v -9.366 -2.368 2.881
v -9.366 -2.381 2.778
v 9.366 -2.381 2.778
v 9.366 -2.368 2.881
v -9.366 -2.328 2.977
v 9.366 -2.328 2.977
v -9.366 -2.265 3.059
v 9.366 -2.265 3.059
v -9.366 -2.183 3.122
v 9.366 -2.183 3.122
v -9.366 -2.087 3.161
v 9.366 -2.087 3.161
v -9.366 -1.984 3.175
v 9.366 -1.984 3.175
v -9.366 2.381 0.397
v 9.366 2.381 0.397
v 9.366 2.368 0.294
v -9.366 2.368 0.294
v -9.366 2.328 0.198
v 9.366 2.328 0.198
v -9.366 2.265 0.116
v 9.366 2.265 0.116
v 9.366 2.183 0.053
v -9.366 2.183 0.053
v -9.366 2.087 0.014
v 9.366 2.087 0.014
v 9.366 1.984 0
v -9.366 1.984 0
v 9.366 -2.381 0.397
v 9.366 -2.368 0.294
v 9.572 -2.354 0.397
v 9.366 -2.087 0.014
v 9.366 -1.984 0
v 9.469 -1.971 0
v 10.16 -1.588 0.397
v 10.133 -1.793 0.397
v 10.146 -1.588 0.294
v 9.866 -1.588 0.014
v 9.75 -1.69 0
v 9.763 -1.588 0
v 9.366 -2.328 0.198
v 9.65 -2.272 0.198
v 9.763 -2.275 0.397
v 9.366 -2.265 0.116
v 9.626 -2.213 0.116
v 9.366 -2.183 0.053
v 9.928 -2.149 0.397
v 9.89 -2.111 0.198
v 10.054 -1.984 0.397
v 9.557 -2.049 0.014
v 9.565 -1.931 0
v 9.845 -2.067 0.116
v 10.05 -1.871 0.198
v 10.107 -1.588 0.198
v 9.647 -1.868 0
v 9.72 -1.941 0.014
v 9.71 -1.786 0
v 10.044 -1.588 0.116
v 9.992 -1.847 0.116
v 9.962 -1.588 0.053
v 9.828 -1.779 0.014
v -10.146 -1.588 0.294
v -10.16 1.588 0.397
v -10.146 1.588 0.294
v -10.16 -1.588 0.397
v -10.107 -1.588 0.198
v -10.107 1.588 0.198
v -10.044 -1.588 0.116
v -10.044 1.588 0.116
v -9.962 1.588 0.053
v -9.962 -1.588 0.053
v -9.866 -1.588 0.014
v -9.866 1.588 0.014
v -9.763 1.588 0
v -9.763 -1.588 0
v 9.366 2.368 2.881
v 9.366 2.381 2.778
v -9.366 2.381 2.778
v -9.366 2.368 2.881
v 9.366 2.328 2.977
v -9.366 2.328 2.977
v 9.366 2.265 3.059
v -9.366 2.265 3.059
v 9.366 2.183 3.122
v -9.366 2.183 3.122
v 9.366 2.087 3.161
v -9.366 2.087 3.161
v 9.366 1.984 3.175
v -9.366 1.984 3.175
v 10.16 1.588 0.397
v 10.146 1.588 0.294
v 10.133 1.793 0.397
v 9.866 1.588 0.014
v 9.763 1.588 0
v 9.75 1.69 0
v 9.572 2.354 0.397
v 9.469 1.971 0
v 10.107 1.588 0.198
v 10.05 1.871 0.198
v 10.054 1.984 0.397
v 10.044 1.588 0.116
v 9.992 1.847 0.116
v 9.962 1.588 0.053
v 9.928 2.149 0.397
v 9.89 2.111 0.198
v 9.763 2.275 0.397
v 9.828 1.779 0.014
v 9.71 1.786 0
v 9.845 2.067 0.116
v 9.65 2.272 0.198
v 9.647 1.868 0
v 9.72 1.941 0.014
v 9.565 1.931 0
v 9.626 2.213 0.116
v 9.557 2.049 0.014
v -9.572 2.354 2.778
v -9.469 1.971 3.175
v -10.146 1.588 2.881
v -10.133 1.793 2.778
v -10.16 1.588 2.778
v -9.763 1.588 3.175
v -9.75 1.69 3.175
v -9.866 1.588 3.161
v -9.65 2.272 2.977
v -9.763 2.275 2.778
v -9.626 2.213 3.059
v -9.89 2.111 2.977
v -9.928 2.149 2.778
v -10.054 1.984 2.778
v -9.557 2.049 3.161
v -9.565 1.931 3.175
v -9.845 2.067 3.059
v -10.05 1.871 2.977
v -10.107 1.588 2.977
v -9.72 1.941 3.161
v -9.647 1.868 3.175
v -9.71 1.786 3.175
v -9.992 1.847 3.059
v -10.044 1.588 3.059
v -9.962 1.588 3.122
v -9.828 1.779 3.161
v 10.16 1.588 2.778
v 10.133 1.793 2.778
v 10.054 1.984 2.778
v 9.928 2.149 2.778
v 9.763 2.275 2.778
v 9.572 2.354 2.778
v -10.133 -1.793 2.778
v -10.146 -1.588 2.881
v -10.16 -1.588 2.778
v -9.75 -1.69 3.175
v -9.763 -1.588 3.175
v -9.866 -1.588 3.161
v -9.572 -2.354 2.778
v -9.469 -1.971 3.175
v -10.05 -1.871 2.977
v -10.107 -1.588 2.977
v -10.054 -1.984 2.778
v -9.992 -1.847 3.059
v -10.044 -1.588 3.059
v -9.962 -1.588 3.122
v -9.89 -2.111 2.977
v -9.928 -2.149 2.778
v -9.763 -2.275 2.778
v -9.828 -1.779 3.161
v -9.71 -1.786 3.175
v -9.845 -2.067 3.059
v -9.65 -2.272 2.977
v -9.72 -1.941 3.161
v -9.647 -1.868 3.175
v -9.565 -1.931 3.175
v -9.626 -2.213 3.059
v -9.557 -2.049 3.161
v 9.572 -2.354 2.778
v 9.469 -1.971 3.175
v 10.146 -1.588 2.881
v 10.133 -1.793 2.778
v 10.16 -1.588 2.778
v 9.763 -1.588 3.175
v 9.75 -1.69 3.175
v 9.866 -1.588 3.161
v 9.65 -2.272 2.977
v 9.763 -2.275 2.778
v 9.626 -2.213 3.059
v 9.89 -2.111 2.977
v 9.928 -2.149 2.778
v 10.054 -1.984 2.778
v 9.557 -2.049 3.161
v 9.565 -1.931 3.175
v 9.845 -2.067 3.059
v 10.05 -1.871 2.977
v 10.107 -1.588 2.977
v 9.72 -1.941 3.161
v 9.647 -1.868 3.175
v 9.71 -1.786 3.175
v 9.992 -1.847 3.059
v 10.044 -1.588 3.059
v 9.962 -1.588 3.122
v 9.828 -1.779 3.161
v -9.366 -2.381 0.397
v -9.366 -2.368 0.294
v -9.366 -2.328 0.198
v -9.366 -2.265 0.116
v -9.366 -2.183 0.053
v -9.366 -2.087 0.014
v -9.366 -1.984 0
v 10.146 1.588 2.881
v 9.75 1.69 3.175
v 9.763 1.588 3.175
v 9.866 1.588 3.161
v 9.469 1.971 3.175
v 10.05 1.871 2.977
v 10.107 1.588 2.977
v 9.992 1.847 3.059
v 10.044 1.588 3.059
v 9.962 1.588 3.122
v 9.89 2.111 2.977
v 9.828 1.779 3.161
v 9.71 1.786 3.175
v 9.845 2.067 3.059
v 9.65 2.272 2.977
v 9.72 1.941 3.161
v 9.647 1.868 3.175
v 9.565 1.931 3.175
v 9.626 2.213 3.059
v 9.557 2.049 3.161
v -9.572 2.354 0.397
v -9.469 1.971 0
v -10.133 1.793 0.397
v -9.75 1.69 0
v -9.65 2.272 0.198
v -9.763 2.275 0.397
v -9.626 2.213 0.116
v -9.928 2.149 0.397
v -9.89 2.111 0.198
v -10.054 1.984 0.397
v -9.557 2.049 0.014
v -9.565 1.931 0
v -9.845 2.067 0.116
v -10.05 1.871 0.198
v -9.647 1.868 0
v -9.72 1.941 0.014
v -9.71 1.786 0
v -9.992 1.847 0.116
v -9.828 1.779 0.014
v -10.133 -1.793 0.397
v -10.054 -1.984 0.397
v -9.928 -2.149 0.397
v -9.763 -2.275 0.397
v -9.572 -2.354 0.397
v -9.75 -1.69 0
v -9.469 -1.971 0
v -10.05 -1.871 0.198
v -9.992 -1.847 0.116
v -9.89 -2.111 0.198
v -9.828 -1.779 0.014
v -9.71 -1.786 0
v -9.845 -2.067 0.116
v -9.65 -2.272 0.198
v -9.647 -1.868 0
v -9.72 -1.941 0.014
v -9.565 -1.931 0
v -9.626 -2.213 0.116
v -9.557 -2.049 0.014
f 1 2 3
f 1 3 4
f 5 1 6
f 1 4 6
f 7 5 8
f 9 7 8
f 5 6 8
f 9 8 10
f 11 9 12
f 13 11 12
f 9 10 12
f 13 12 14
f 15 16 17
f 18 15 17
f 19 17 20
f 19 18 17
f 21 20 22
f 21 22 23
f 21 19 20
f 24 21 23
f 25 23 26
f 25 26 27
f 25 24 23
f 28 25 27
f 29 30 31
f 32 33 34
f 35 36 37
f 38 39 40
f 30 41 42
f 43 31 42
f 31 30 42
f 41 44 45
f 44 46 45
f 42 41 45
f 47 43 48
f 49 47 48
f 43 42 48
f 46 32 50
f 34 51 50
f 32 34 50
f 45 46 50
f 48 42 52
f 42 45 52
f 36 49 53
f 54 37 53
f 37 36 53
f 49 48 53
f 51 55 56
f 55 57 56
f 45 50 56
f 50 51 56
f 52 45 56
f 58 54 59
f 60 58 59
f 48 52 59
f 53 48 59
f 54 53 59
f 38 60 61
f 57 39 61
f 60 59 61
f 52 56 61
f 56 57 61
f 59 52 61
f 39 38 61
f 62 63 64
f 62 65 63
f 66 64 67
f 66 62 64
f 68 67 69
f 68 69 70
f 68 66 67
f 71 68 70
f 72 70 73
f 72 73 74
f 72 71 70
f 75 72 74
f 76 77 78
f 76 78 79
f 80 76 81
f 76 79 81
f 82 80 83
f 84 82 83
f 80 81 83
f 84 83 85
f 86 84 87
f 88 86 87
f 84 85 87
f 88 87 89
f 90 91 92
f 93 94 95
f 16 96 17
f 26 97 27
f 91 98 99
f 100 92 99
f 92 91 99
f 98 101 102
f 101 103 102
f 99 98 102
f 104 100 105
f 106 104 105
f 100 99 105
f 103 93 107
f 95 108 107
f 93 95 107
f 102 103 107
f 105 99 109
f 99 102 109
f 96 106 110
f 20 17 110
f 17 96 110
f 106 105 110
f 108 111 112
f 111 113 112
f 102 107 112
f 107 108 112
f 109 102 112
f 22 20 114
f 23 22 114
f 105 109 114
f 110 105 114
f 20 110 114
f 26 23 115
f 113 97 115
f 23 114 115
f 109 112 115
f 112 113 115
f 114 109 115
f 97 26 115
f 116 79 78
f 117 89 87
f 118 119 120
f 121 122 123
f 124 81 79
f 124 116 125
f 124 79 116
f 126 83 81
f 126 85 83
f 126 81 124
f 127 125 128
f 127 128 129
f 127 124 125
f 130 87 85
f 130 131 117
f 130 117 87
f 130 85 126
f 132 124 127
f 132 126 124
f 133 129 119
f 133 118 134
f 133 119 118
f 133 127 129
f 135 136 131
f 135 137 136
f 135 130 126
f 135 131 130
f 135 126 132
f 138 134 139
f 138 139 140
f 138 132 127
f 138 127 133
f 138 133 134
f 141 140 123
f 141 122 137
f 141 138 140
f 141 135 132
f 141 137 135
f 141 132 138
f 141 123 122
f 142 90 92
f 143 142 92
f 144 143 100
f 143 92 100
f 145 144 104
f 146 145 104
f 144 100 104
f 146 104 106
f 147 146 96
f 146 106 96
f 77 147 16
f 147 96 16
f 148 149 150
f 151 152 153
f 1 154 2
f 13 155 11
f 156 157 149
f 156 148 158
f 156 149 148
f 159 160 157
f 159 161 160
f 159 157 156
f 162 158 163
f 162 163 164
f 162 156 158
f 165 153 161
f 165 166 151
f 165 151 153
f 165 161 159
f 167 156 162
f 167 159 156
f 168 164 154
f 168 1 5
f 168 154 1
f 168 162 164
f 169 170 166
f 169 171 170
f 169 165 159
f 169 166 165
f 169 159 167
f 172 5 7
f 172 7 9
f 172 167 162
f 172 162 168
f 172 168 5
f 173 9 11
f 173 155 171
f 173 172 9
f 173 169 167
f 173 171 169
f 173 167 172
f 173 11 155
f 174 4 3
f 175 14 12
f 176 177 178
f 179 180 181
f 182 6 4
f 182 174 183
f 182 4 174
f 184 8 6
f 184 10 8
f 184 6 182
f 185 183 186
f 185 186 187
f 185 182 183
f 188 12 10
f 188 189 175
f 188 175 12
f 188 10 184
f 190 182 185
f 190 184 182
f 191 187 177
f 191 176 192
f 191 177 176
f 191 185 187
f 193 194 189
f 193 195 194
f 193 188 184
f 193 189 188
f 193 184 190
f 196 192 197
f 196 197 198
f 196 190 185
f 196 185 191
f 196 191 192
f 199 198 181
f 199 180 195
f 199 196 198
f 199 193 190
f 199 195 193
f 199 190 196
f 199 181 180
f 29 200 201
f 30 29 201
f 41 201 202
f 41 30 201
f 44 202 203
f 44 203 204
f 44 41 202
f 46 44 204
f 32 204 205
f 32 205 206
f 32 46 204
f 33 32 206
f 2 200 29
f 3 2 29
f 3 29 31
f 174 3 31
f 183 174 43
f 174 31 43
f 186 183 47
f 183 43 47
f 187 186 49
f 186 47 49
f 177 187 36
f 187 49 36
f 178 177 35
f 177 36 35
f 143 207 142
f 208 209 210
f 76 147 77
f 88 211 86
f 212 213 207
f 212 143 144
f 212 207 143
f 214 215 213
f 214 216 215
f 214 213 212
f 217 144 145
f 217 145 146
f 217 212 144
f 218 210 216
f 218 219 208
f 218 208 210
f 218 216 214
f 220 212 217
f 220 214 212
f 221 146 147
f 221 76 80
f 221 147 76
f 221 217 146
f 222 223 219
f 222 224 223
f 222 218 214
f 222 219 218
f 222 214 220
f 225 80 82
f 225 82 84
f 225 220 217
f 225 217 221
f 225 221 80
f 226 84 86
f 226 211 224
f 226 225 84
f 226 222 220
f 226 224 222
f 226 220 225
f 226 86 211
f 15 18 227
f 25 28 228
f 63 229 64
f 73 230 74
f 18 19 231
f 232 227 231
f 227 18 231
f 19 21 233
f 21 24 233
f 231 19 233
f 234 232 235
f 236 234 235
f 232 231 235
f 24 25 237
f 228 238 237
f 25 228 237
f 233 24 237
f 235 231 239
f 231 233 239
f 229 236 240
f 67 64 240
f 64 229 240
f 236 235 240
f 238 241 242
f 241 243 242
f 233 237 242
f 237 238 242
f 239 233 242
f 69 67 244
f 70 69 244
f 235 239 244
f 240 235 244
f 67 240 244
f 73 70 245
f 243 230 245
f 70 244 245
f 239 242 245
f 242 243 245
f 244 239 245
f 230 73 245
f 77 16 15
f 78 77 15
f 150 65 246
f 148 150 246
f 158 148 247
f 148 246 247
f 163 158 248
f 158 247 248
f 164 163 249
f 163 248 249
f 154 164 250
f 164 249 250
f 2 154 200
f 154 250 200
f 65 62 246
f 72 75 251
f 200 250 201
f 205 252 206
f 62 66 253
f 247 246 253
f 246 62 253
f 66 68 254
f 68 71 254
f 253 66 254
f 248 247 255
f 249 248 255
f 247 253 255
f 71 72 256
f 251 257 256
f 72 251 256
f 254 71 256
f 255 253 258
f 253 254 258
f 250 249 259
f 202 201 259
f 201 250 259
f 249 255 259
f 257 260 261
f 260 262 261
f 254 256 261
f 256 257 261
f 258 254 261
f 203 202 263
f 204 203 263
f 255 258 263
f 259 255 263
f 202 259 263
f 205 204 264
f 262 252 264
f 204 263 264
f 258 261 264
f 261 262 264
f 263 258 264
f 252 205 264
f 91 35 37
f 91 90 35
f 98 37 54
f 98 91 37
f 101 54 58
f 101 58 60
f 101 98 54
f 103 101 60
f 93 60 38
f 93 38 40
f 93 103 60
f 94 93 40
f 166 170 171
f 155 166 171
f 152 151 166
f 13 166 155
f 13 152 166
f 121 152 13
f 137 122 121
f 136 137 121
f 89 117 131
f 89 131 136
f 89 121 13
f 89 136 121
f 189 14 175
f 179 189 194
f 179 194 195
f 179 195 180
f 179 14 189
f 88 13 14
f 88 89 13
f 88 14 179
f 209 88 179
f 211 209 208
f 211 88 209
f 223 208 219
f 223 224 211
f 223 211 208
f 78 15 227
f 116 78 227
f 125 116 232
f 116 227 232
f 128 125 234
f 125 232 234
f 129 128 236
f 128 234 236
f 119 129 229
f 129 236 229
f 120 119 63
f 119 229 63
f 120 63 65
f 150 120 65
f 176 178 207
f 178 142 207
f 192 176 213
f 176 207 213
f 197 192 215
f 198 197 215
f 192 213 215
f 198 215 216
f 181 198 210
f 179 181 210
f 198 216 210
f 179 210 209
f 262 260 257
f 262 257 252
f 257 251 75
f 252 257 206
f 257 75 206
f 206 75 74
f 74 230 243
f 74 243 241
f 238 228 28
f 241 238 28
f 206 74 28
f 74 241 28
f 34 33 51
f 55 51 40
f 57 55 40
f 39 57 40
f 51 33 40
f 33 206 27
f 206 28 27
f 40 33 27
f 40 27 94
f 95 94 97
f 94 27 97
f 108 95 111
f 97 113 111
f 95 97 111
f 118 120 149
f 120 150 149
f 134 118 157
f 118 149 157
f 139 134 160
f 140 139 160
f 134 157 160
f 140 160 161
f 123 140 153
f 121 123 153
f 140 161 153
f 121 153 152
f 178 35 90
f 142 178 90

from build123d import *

# Parameters (mm, degrees)
F0_W     = 4.7625
F0_H     = 4.7625
F1_DEPTH = 3.175
F2_R     = 0.396875


with BuildPart() as f1:
    # F0 (on Top) → F1 (new body)
    with BuildSketch(Plane.XY):
        with BuildLine():
            Line((9.36625, 2.38125), (2.38125, 2.38125))
            Line((2.38125, 2.38125), (2.38125, -2.38125))
            Line((2.38125, -2.38125), (9.36625, -2.38125))
            ThreePointArc((9.36625, -2.38125), (9.9275160076, -2.1487660076), (10.16, -1.5875))
            Line((10.16, -1.5875), (10.16, 1.5875))
            ThreePointArc((10.16, 1.5875), (9.9275160076, 2.1487660076), (9.36625, 2.38125))
        make_face()
        Rectangle(F0_W, F0_H)
        with BuildLine():
            Line((-2.38125, -2.38125), (-2.38125, 2.38125))
            Line((-2.38125, 2.38125), (-9.36625, 2.38125))
            ThreePointArc((-9.36625, 2.38125), (-9.9275160076, 2.1487660076), (-10.16, 1.5875))
            Line((-10.16, 1.5875), (-10.16, -1.5875))
            ThreePointArc((-10.16, -1.5875), (-9.9275160076, -2.1487660076), (-9.36625, -2.38125))
            Line((-9.36625, -2.38125), (-2.38125, -2.38125))
        make_face()
    extrude(amount=F1_DEPTH)

    # F2
    f2_edges = [f1.edges().sort_by_distance(p)[0] for p in [
        (0, 2.38125, 3.175),
        (-9.927516, 2.148766, 3.175),
        (-10.16, 0, 3.175),
        (-9.927516, -2.148766, 3.175),
        (0, -2.38125, 3.175),
        (9.927516, -2.148766, 3.175),
        (10.16, 0, 3.175),
        (9.927516, 2.148766, 3.175),
        (0, 2.38125, 0),
        (-9.927516, 2.148766, 0),
        (-10.16, 0, 0),
        (-9.927516, -2.148766, 0),
        (0, -2.38125, 0),
        (9.927516, -2.148766, 0),
        (10.16, 0, 0),
        (9.927516, 2.148766, 0),
    ]]
    fillet(f2_edges, radius=F2_R)


solid = f1.part
